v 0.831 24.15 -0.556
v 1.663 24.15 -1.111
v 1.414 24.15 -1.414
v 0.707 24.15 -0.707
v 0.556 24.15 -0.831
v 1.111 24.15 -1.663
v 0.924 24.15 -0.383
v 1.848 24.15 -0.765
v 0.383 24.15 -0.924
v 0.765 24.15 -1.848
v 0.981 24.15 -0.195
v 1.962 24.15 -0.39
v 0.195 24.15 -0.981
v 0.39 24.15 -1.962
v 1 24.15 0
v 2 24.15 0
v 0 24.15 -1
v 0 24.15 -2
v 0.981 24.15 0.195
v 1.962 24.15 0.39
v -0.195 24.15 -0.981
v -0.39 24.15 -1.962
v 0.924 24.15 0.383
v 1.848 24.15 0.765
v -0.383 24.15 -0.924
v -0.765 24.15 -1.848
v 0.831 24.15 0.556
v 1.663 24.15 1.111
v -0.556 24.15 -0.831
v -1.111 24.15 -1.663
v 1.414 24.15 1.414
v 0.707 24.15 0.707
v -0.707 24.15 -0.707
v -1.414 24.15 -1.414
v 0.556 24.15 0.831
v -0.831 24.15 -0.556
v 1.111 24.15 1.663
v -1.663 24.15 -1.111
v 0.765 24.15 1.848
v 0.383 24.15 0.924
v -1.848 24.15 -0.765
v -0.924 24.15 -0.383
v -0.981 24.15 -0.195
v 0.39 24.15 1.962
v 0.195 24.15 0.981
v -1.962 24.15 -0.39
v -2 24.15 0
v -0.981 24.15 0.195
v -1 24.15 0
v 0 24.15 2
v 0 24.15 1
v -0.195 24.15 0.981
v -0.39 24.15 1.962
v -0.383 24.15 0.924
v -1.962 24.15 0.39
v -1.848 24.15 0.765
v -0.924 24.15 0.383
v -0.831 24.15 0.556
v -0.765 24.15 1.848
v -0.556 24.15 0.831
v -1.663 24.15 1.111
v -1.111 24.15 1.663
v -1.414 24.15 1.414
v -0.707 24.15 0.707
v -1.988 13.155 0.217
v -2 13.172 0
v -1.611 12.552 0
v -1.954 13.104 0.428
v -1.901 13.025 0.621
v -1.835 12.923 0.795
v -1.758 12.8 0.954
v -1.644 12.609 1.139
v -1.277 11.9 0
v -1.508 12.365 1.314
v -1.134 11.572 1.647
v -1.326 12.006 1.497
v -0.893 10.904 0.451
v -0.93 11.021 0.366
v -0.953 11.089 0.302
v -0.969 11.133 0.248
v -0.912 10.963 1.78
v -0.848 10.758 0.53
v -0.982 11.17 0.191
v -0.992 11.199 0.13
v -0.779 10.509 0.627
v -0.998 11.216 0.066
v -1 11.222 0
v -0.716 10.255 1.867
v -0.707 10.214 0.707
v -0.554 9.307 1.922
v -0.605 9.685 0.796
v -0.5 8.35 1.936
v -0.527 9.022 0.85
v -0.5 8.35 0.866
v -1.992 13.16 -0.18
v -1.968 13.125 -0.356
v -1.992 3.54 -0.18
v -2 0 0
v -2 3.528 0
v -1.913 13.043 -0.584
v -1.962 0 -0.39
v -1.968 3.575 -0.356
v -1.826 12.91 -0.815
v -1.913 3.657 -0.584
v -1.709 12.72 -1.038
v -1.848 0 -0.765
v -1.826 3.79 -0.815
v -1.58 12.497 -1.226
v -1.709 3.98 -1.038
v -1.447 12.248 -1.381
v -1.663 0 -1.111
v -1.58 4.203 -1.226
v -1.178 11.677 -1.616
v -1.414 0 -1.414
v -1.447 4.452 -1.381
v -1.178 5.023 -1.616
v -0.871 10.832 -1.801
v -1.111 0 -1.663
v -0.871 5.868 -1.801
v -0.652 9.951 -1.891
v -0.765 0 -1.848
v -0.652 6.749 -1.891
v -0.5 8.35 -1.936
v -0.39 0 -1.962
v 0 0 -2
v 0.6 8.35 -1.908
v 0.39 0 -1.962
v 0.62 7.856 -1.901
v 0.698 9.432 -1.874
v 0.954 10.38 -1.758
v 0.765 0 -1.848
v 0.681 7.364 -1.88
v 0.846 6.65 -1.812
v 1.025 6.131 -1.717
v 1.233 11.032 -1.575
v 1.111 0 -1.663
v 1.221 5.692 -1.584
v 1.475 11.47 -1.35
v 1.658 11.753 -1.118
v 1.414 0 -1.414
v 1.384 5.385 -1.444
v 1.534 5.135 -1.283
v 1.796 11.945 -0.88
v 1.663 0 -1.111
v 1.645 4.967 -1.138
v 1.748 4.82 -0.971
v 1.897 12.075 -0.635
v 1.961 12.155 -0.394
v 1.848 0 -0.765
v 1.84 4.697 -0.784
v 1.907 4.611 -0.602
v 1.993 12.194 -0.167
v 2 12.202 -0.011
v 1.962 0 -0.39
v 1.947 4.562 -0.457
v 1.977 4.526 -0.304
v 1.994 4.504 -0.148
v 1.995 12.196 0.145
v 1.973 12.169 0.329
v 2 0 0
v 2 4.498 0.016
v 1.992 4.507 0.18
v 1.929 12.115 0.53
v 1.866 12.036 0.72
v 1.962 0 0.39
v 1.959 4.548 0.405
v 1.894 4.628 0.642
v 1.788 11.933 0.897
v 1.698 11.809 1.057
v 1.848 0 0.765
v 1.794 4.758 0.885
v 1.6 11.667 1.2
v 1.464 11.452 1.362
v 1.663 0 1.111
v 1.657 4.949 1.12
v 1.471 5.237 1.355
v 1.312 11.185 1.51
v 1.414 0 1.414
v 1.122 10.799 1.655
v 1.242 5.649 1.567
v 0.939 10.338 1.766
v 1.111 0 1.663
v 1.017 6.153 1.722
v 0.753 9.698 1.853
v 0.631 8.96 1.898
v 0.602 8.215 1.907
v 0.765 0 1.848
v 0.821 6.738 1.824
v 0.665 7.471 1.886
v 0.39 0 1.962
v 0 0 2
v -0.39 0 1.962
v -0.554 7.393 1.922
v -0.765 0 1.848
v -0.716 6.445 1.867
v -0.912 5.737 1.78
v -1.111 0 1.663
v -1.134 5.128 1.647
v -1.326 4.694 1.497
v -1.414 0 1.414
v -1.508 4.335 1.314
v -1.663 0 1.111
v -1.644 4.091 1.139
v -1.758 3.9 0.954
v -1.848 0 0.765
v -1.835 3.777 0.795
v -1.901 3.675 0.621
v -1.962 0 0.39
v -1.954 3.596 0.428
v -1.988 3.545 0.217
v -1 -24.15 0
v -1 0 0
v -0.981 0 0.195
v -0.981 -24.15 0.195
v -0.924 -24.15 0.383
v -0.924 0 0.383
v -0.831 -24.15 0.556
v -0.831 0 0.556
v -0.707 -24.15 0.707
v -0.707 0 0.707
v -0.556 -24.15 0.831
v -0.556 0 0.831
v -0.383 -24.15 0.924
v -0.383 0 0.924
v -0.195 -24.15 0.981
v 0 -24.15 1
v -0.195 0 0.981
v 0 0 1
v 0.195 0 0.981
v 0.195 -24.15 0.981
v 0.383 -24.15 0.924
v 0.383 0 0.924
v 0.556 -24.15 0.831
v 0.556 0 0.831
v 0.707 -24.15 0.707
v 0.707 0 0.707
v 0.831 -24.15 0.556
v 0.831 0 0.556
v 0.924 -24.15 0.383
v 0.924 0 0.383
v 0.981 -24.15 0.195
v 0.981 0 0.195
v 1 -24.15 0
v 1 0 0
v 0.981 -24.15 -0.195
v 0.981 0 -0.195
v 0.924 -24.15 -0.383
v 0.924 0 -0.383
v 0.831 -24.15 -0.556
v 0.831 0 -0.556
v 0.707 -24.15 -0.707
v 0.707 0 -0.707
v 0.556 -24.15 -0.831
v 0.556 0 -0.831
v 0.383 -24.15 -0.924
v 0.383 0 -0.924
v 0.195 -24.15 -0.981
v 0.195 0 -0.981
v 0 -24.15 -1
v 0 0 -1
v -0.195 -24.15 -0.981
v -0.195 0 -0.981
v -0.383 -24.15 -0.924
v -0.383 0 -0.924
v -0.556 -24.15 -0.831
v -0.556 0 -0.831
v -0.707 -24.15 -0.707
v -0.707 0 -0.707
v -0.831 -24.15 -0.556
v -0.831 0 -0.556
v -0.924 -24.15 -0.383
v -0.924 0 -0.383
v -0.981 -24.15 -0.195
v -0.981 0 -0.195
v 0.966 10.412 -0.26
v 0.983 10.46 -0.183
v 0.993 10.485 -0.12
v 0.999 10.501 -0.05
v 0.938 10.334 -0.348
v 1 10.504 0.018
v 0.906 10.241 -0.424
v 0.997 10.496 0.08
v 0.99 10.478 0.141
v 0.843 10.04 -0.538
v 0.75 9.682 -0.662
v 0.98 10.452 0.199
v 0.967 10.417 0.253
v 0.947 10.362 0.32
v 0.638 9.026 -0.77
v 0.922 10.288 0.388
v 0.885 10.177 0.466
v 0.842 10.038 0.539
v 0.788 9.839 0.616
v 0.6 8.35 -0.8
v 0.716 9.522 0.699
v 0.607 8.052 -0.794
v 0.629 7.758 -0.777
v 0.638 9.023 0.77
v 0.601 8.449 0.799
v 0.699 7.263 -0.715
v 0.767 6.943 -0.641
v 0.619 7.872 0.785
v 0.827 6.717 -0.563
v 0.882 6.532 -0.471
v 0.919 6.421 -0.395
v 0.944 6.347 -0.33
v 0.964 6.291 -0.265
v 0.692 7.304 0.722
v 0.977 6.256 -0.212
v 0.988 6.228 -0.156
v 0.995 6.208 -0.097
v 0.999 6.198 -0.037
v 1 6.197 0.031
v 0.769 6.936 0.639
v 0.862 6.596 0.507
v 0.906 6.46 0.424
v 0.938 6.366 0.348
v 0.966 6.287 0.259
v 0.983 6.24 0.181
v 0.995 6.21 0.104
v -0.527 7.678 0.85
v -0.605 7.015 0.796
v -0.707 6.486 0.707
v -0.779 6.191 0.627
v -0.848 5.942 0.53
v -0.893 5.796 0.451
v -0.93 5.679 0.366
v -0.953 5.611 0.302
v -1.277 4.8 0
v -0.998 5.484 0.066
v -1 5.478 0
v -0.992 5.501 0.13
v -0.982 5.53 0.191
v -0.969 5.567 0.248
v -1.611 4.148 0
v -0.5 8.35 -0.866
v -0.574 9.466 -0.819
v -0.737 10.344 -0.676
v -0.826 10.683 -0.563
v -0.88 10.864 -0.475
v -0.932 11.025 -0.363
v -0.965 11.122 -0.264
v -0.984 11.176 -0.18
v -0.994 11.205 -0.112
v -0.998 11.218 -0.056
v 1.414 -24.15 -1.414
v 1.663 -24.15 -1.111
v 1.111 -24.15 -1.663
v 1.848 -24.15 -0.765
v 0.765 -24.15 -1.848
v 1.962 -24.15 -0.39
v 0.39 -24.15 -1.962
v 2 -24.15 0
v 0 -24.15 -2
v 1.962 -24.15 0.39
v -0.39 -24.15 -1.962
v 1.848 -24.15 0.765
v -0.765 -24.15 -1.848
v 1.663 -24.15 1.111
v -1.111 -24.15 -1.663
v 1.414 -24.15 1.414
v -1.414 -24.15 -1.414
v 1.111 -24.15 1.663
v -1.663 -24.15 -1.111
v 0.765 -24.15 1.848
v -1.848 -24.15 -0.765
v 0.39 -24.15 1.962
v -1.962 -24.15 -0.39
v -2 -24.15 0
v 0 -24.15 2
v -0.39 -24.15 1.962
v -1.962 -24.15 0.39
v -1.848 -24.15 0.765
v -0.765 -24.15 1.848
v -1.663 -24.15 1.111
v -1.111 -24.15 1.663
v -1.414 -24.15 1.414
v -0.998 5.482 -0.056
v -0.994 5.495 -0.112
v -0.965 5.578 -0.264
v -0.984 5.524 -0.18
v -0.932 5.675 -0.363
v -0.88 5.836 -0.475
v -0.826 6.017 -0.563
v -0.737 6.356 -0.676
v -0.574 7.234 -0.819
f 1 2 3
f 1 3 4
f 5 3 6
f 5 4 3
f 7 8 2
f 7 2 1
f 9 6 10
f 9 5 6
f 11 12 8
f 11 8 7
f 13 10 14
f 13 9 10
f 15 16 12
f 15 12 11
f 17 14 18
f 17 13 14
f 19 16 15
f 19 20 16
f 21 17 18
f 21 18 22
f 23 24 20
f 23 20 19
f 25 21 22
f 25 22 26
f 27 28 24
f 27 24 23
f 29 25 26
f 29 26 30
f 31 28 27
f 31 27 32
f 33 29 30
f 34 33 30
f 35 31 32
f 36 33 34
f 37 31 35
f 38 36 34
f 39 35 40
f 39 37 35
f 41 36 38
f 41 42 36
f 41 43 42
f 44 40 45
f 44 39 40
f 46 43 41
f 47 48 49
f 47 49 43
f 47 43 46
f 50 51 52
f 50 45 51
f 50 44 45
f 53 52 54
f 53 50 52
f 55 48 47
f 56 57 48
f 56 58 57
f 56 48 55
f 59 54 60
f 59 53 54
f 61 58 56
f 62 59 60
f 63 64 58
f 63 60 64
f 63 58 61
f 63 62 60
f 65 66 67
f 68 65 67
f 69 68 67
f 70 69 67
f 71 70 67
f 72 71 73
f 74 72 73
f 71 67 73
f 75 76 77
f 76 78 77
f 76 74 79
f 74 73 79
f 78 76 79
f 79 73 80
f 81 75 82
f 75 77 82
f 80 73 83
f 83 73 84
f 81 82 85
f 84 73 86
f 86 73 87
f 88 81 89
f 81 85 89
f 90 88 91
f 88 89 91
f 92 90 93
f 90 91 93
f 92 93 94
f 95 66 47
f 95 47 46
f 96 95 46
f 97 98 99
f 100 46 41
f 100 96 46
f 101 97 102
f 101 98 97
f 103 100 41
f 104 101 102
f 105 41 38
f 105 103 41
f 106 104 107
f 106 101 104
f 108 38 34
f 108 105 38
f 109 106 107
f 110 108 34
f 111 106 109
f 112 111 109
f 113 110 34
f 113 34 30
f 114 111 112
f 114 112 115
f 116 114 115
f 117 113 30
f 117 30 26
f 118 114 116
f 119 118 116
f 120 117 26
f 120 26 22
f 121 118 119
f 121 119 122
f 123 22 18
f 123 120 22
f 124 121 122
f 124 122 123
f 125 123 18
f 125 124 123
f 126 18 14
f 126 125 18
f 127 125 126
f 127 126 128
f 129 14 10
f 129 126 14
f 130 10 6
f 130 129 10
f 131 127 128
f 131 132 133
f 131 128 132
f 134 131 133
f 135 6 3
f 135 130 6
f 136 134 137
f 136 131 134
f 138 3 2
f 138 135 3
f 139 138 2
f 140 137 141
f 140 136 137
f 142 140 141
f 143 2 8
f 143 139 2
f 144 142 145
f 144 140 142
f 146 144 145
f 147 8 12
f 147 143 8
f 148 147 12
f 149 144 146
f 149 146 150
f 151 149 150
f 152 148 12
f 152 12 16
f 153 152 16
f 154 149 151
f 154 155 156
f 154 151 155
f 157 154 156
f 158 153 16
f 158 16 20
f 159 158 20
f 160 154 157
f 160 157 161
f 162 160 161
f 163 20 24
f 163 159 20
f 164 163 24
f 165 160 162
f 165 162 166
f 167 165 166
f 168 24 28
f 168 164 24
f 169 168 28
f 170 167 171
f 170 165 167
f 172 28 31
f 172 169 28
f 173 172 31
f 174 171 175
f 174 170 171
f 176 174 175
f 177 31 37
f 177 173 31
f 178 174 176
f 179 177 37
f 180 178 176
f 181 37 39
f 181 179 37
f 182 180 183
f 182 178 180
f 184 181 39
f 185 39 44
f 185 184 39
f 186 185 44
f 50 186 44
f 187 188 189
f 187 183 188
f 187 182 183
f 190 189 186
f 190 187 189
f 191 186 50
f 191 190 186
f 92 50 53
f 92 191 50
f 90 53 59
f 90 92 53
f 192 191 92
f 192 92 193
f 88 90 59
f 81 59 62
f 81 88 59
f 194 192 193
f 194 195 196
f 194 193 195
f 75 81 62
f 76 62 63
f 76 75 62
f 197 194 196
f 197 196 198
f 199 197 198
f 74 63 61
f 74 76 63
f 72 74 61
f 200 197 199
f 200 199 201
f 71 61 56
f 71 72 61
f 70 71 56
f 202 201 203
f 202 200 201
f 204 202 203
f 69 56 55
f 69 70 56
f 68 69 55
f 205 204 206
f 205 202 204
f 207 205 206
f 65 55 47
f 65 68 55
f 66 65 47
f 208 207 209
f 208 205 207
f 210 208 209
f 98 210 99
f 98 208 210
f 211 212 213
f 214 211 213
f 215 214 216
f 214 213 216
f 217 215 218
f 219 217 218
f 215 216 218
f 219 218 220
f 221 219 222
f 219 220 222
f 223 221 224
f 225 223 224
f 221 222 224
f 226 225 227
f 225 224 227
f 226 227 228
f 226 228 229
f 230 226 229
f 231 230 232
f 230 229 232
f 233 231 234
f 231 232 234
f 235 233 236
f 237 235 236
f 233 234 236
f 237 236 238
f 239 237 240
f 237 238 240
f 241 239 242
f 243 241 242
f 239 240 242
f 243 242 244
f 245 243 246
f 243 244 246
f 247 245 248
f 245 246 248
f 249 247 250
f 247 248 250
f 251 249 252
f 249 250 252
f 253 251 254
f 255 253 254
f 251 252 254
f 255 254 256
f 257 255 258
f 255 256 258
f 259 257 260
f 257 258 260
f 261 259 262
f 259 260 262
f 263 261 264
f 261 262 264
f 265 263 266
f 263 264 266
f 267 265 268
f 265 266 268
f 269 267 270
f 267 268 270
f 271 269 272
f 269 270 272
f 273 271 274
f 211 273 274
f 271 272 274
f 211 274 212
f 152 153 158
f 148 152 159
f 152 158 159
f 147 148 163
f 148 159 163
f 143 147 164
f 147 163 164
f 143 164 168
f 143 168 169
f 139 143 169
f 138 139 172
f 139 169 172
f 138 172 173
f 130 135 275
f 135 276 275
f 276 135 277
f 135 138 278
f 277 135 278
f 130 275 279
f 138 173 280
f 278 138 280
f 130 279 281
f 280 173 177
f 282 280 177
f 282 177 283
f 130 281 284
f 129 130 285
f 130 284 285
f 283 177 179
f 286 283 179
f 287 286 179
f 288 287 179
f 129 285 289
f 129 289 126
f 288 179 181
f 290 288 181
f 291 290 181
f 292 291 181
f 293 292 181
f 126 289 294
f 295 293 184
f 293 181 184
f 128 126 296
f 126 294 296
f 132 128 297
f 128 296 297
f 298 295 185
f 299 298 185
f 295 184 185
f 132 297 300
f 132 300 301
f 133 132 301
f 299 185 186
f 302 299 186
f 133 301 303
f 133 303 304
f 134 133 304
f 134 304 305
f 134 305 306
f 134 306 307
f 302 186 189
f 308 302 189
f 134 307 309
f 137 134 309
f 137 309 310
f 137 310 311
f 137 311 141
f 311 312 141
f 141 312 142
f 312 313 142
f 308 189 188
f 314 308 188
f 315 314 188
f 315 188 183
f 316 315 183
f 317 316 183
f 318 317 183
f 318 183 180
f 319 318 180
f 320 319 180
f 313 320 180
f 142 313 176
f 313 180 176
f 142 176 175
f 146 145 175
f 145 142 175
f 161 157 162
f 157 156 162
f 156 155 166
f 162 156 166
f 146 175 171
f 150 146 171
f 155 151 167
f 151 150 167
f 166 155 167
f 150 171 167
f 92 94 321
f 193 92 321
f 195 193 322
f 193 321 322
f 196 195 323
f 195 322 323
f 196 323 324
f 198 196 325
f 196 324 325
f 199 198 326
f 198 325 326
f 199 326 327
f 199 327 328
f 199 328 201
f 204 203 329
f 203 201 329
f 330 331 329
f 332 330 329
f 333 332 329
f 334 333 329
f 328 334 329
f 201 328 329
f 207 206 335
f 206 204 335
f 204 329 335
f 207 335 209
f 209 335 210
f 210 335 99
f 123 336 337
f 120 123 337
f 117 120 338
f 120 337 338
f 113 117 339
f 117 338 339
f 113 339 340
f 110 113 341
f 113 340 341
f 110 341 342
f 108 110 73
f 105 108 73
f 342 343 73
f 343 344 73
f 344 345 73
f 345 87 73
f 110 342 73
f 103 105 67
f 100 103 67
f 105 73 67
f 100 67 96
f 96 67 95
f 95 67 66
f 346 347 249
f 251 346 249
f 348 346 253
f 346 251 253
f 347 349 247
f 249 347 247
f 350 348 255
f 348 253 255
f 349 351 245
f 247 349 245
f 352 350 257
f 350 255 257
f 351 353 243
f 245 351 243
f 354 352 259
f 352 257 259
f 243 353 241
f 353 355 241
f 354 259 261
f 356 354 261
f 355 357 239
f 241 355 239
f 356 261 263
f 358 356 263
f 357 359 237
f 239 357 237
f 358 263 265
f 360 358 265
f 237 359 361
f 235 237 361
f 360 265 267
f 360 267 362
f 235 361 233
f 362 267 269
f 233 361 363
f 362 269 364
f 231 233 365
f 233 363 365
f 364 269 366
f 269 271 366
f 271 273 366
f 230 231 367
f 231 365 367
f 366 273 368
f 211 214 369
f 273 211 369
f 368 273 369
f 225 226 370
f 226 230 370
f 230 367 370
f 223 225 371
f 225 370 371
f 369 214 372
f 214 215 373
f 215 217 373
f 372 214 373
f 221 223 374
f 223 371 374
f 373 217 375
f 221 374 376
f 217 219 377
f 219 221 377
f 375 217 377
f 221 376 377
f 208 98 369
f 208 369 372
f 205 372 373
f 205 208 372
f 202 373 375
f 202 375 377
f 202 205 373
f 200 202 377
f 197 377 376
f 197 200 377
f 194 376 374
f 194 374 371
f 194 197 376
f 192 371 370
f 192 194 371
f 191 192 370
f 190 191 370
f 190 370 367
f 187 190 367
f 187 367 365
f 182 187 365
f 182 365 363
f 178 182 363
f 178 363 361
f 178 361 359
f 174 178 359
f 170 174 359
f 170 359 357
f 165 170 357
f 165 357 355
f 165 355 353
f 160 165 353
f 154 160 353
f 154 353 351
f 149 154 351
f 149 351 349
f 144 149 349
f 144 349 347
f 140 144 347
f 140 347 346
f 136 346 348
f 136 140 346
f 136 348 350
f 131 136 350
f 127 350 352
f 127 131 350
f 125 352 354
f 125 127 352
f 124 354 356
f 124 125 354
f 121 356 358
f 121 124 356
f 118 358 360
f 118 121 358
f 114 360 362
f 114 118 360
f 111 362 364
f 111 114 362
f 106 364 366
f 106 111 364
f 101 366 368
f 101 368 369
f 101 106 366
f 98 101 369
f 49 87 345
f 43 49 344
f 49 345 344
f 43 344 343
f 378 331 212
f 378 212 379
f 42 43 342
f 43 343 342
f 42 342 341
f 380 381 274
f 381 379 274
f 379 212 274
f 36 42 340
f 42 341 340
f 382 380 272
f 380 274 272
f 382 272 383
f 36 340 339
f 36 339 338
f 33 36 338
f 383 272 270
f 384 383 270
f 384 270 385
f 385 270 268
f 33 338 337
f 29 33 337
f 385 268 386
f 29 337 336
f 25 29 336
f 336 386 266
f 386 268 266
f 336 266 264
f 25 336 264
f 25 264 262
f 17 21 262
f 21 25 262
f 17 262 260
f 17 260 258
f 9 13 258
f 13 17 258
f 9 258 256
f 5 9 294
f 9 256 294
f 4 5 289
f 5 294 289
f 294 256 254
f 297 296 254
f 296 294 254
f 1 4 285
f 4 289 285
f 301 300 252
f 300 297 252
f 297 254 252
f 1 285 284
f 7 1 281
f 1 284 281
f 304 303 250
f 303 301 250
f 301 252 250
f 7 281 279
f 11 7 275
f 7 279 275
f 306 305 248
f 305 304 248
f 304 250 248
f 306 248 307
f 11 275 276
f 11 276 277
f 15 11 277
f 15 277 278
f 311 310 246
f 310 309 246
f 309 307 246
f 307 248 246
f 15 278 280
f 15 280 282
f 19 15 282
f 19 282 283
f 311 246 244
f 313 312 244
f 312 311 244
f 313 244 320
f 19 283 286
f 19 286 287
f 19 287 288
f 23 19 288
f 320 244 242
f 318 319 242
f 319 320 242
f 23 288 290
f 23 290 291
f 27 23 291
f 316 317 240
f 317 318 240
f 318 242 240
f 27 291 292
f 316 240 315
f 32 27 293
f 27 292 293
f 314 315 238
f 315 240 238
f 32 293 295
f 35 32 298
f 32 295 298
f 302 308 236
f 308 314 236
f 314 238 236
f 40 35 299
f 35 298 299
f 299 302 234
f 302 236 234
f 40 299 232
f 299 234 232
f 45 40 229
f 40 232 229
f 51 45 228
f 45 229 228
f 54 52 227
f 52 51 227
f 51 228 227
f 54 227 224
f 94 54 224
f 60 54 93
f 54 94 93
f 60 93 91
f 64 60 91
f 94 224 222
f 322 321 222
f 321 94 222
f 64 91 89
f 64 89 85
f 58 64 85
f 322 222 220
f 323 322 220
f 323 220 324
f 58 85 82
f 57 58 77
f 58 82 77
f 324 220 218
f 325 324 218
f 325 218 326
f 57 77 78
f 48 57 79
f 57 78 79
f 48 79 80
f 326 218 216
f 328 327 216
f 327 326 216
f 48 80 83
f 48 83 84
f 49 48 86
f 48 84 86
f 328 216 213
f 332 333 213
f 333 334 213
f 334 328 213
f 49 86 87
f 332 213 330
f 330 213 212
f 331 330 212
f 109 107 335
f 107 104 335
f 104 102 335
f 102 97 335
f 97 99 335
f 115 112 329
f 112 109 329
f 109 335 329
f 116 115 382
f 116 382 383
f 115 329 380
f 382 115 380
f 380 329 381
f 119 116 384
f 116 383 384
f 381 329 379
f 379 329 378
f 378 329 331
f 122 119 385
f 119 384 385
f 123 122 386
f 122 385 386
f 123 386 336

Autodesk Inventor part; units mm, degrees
ref_plane "YZ Plane" through (0, 0, 0) normal (1, 0, 0) x (0, 1, 0)
ref_plane "XZ Plane" through (0, 0, 0) normal (0, 1, 0) x (-1, 0, 0)
ref_plane "XY Plane" through (0, 0, 0) normal (0, 0, 1) x (1, 0, 0)
sketch "Sketch1" plane through (0, 0, 0) normal (0, 1, 0) x (-1, 0, 0)
  circle A0 centre (0, 0) radius 2
  circle A1 centre (0, 0) radius 1
  dimension "d0" = 4
  dimension "d3" = 1
extrude "Extrusion1" add sketch "Sketch1" along normal mid plane 48.3
sketch "Sketch2" plane through (0, 0, 0) normal (0, 0, 1) x (1, 0, 0)
  circle A0 centre (6.1, 8.35) radius 5.5 construction
  line L0 (2, 24.15) -> (-2, 24.15) projected
  circle A1 centre (-9, 8.35) radius 8.5
  line L1 (-0.875, -5) -> (0.875, -5)
  line L2 (0.875, -5) -> (0.875, 5)
  line L3 (0.875, 5) -> (-0.875, 5)
  line L4 (-0.875, 5) -> (-0.875, -5)
  line L5 (-0.875, -5) -> (0.875, 5)
  line L6 (0.875, -5) -> (-0.875, 5)
  circle A2 centre (6.6, 8.35) radius 6
  line L7 (1, 24.15) -> (1, -24.15) projected
  line L8 (-2, -24.15) -> (2, -24.15) projected
  point P0 (0, 0)
  point P1 (0.875, 4.8043)
  point P2 (0.875, 4.7957)
  dimension "d6" = 11
  dimension "d8" = 17
  dimension "d12" = 1.75
  dimension "d13" = 10
  dimension "d18" = 12
  dimension "d20" = 1.5
  dimension "d21" = 1.1
  dimension "d25" = 9
  dimension "d26" = 15.8
extrude "Extrusion2" cut sketch "Sketch2" along normal mid plane 10 contours A1 | A2 L7 | L7 A2
properties part number "Fillament Guide" material "Polypropylene"
